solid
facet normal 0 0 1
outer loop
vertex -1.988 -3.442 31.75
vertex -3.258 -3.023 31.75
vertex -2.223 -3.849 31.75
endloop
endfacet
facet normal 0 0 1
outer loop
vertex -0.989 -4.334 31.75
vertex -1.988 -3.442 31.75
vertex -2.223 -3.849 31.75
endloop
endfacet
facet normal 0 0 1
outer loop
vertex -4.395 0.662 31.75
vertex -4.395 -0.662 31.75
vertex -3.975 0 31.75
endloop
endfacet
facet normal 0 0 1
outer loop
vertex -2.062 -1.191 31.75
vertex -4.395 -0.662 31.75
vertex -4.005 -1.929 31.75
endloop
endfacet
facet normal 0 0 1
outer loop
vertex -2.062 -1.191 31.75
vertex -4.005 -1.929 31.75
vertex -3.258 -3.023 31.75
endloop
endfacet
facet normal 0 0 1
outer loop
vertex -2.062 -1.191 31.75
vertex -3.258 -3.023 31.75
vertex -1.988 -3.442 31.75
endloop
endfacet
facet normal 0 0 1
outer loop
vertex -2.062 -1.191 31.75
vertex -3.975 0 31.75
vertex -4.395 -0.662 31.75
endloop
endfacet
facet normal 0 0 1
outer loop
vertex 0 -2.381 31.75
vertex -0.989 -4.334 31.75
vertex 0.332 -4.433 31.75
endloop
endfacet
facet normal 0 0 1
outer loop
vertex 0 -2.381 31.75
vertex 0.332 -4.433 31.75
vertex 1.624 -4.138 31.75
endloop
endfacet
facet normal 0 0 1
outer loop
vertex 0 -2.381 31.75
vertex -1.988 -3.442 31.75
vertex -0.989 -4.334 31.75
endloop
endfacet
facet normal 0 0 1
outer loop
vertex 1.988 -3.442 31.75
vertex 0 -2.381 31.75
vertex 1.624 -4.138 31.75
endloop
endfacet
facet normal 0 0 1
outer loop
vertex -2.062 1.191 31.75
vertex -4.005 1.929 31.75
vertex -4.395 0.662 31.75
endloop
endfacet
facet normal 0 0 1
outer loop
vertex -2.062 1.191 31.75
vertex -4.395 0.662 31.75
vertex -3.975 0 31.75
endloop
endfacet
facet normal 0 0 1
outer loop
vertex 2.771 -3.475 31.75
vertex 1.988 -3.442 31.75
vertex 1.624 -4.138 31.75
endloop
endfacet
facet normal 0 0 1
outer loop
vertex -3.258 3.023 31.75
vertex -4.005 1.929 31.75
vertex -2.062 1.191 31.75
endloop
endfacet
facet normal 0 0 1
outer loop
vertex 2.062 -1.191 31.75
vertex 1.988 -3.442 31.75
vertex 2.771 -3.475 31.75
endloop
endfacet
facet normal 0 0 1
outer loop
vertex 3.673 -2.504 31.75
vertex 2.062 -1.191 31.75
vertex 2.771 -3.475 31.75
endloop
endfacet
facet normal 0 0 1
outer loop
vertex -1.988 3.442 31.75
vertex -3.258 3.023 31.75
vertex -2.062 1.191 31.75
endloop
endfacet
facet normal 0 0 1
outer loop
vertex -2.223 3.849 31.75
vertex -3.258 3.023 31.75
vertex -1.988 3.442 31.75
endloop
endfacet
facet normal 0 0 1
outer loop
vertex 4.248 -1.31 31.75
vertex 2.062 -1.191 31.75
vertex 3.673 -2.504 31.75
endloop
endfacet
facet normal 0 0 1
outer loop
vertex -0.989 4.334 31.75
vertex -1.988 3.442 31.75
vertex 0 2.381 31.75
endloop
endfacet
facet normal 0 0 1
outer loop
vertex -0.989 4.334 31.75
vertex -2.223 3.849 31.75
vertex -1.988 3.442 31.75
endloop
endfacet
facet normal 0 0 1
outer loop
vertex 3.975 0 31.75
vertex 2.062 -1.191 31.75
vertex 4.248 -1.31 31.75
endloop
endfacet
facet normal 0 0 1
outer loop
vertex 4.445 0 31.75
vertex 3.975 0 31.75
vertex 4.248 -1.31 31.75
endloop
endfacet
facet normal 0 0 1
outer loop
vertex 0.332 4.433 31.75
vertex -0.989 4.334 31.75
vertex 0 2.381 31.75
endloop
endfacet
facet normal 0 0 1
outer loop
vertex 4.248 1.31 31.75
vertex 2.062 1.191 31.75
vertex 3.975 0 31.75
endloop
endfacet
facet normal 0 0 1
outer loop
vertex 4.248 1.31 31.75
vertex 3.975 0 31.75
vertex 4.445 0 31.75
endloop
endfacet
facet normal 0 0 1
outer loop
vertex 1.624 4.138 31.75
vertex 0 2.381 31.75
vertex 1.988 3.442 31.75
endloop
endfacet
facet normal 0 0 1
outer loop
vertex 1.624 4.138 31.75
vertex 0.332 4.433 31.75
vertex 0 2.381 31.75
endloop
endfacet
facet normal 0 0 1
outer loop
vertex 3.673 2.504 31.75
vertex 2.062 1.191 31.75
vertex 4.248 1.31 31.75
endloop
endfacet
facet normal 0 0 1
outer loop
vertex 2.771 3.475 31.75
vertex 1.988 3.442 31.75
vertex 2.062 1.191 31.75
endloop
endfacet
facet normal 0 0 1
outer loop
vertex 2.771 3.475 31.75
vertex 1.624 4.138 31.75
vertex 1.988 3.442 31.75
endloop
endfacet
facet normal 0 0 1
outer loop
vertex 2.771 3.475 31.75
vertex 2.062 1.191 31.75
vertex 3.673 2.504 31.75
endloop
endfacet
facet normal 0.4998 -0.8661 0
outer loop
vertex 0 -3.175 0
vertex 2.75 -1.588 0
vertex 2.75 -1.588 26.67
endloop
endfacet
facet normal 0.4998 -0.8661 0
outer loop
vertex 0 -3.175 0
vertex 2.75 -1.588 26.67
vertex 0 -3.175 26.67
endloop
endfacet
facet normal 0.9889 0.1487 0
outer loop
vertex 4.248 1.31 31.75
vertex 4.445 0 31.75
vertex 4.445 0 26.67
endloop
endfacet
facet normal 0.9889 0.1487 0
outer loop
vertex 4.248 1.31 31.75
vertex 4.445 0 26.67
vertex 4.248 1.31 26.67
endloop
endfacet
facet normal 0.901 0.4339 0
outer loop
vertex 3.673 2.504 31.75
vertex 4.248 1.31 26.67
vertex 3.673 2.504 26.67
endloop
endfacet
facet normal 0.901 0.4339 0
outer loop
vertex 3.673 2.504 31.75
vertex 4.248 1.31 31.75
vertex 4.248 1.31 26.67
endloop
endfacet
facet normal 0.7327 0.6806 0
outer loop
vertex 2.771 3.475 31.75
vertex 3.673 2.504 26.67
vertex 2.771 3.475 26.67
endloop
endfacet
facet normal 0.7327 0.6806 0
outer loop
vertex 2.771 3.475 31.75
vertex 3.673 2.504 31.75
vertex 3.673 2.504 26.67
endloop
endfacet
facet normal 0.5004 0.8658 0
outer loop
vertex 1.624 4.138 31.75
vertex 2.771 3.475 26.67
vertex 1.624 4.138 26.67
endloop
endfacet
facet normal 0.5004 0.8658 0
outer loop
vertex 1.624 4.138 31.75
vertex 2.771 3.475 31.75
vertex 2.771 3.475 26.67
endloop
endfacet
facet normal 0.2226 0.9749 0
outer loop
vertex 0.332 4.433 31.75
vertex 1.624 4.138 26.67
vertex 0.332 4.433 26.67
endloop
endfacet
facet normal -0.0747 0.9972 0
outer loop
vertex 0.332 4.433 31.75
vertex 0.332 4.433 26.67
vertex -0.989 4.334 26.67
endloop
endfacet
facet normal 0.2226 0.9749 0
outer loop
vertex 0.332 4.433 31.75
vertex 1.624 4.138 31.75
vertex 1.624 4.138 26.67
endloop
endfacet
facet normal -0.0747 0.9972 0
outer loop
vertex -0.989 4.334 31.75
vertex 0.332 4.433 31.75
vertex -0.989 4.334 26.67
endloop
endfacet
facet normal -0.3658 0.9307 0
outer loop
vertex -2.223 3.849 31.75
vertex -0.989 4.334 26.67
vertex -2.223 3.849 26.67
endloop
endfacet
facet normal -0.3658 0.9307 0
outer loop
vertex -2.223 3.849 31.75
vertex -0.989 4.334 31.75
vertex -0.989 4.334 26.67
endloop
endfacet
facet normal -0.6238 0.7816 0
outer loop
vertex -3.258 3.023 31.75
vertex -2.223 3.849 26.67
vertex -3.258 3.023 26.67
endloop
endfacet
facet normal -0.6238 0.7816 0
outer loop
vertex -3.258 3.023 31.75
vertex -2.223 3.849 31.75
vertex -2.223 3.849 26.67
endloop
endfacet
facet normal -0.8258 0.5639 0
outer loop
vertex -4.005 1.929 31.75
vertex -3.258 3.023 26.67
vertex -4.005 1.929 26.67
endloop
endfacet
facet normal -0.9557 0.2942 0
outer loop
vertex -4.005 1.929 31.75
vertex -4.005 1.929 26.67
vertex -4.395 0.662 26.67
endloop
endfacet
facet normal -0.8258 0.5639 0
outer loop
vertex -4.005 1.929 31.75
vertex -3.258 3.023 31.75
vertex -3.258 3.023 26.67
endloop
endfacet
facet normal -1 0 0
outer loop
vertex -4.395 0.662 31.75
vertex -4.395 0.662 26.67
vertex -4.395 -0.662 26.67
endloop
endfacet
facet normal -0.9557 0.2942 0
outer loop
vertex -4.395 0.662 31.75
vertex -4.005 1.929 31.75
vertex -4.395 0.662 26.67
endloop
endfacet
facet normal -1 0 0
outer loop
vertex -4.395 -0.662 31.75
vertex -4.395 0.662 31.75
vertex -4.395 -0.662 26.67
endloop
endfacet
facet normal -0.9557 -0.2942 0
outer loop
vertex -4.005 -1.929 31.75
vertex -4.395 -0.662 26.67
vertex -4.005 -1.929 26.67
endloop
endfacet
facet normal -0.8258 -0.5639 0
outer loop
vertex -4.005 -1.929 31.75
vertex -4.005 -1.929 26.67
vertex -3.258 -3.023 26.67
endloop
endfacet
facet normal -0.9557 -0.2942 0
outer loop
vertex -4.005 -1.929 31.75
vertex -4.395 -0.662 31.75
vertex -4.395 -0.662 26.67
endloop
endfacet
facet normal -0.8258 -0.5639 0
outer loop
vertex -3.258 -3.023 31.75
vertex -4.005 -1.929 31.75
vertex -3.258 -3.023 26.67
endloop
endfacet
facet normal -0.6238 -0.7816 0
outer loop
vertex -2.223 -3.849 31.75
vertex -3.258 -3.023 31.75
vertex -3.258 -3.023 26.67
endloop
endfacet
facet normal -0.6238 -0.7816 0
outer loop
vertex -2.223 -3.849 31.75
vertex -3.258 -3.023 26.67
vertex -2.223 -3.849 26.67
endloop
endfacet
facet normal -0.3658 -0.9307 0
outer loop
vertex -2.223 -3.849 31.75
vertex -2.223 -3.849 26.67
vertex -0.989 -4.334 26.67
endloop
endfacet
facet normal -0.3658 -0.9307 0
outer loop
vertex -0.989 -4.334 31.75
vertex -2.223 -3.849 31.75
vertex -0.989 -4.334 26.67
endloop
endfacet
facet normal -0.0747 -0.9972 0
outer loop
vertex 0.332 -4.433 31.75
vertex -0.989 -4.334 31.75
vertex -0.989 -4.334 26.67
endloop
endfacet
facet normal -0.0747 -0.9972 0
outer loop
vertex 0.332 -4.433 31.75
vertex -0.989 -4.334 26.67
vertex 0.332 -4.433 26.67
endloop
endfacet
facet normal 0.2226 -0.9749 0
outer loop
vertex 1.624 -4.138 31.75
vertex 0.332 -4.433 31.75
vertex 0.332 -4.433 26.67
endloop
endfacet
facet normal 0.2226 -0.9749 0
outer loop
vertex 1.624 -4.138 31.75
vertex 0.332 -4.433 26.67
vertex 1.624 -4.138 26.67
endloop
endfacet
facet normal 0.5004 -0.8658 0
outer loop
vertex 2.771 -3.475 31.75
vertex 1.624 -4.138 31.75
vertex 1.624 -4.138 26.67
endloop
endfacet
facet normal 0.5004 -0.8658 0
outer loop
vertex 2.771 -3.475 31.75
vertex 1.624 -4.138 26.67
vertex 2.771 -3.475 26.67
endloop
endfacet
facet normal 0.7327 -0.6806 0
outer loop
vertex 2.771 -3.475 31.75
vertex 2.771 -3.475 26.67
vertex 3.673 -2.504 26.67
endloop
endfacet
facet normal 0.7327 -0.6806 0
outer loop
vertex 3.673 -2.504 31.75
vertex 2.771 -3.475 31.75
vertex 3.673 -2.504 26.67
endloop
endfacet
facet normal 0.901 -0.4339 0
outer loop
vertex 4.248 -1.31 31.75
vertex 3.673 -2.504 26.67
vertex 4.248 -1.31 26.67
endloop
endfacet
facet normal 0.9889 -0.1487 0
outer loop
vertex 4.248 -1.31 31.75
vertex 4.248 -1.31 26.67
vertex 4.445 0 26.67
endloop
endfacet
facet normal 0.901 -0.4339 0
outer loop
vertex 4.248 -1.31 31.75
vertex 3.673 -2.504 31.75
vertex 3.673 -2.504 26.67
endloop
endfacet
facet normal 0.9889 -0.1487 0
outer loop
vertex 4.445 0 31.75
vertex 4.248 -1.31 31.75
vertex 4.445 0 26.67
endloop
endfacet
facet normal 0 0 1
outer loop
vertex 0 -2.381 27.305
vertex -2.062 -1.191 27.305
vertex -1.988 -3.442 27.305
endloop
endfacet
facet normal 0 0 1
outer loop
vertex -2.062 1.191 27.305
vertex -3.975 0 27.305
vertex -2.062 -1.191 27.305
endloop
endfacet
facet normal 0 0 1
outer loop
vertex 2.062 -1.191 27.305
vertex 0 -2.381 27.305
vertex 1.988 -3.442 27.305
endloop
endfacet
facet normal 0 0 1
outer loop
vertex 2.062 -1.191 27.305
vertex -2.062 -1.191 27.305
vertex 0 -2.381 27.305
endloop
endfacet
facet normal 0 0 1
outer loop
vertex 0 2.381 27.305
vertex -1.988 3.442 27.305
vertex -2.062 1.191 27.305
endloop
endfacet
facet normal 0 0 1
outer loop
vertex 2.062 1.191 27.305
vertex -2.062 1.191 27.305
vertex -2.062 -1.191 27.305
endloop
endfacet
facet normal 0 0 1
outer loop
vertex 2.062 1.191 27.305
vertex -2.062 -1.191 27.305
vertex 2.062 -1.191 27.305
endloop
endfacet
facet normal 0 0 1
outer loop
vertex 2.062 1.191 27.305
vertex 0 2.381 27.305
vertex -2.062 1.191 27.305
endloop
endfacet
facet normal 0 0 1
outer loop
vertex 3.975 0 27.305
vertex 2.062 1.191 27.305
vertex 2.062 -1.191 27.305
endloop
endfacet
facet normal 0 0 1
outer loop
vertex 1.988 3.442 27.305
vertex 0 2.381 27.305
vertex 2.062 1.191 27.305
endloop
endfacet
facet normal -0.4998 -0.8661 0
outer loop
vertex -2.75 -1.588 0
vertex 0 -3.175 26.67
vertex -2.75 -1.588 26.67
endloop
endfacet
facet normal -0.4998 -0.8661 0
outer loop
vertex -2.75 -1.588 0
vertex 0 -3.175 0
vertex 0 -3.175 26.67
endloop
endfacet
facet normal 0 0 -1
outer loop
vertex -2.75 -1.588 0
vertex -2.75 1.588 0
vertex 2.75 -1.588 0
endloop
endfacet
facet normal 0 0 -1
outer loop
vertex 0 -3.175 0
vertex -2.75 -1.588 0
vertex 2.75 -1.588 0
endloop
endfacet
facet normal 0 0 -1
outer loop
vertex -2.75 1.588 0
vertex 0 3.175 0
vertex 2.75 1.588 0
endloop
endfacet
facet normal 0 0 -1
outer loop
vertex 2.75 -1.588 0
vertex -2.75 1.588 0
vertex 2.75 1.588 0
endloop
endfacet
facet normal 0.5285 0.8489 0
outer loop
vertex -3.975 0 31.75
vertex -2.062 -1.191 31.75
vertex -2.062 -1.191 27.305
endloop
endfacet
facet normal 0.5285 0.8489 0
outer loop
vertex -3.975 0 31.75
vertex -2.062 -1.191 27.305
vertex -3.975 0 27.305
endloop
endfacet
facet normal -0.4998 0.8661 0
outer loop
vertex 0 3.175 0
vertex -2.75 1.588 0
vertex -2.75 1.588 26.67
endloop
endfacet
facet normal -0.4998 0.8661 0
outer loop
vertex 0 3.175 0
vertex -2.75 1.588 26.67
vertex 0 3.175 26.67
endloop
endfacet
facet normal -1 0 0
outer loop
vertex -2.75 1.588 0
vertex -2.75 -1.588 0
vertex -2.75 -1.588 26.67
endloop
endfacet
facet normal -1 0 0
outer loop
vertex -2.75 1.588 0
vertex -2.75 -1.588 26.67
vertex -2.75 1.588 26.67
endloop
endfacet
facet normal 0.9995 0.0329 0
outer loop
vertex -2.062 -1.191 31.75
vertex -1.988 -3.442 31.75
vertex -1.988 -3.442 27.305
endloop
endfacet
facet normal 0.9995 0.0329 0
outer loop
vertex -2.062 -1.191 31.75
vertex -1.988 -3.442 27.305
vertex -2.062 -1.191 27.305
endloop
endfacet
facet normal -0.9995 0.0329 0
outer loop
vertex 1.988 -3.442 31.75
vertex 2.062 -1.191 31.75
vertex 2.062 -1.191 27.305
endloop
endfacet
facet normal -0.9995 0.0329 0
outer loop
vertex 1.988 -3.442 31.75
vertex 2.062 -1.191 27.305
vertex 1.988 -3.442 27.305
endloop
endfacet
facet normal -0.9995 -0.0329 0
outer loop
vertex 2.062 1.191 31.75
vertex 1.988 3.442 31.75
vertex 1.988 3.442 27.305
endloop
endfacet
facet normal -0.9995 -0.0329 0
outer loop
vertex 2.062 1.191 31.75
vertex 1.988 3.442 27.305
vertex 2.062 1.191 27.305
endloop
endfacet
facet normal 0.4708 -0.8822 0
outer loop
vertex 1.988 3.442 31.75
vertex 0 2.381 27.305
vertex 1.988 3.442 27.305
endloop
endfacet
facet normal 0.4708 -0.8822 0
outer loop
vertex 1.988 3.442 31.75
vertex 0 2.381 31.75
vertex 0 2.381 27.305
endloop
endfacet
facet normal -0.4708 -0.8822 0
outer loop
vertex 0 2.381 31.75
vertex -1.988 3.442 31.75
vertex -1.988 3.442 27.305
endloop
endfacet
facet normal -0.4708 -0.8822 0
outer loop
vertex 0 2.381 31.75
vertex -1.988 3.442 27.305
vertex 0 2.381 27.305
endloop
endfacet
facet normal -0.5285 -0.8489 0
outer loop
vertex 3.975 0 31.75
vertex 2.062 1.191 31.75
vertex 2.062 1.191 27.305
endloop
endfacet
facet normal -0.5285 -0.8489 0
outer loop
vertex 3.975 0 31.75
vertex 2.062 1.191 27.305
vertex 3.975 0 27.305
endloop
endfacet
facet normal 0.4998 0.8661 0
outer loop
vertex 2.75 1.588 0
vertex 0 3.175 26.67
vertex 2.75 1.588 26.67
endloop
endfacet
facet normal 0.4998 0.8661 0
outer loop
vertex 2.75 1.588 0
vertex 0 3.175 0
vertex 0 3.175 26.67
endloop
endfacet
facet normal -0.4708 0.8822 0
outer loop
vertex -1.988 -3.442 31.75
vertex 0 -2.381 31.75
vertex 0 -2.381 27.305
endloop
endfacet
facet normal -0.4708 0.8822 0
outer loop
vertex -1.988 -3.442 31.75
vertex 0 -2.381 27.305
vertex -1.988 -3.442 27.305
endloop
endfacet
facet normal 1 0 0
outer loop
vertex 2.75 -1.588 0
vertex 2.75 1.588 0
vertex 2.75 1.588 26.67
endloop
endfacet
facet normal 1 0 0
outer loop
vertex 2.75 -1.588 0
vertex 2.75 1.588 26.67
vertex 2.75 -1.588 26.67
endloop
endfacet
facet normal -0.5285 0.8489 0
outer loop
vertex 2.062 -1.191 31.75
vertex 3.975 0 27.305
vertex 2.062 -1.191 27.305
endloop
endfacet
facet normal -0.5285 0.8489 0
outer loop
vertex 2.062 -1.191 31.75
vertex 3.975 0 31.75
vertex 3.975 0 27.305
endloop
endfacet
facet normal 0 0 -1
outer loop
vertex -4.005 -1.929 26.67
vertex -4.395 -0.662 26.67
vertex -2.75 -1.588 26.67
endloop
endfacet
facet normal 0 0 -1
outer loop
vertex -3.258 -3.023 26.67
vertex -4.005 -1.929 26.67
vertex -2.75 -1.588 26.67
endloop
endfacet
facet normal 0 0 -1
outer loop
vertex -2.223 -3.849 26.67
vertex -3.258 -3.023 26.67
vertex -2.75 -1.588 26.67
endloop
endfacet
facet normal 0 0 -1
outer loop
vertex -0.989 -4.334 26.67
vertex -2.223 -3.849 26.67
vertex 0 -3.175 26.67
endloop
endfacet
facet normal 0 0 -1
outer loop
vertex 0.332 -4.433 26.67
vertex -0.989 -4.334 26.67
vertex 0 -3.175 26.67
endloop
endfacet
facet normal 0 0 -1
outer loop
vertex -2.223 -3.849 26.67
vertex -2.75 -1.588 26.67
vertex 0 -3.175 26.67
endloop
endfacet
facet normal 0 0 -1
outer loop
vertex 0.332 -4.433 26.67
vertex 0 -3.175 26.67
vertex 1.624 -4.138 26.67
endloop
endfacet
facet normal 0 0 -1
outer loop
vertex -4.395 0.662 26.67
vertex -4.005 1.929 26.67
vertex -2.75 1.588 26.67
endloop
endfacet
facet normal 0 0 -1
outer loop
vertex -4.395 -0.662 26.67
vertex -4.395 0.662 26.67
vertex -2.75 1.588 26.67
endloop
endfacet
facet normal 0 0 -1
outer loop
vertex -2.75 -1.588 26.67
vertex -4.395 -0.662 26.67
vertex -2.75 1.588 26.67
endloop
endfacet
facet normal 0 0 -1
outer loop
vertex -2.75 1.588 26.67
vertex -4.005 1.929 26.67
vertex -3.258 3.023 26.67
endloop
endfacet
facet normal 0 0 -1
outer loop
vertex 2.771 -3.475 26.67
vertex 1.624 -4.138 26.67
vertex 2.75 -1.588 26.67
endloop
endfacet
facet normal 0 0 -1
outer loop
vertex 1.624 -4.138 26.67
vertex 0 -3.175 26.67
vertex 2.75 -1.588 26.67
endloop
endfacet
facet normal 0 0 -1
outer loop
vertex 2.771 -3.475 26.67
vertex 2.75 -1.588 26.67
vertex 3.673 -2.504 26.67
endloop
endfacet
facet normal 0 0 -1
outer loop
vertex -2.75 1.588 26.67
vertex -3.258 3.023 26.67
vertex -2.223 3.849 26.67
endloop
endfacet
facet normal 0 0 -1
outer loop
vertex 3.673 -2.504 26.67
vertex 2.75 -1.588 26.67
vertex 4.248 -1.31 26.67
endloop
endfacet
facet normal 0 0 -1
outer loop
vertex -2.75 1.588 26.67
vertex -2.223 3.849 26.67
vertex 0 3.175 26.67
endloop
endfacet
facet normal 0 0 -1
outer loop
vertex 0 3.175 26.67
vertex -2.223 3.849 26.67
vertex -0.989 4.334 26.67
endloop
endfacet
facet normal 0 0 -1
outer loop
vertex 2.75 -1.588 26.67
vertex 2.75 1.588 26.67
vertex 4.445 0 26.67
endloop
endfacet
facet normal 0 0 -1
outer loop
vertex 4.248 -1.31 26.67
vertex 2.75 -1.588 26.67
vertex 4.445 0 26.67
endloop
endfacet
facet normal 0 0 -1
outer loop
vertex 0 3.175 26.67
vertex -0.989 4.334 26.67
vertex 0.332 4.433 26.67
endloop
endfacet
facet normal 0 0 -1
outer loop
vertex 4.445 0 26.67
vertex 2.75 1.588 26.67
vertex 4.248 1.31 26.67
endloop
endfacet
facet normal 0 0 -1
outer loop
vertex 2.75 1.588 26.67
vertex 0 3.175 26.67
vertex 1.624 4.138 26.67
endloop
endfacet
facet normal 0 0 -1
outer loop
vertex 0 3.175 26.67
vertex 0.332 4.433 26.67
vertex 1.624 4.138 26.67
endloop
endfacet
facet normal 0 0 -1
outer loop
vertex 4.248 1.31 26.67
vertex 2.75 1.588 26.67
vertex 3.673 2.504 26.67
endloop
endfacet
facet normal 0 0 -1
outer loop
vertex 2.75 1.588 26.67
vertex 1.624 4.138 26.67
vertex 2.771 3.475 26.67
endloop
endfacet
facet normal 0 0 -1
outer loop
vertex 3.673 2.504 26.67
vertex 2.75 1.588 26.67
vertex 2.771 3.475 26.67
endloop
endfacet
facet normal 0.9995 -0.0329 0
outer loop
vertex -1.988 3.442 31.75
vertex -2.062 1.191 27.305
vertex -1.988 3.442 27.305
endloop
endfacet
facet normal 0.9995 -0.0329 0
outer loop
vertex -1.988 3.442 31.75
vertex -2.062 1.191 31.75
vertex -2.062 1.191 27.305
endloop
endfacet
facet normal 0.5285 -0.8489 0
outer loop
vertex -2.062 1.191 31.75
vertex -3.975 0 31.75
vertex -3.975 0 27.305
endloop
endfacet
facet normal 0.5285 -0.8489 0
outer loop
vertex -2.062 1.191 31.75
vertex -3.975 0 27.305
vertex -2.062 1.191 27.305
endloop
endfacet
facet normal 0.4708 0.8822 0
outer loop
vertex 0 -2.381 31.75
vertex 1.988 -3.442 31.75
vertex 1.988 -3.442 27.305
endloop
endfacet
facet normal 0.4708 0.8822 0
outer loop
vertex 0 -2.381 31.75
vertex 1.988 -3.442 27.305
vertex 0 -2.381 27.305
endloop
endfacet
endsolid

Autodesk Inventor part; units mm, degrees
ref_plane "YZ Plane" through (0, 0, 0) normal (1, 0, 0) x (0, 1, 0)
ref_plane "XZ Plane" through (0, 0, 0) normal (0, 1, 0) x (-1, 0, 0)
ref_plane "XY Plane" through (0, 0, 0) normal (0, 0, 1) x (1, 0, 0)
sketch "Sketch1" plane through (0, 0, 0) normal (0, 0, 1) x (1, 0, 0)
  line L0 (0, 3.175) -> (2.7496, 1.5875)
  line L1 (2.7496, 1.5875) -> (2.7496, -1.5875)
  line L2 (2.7496, -1.5875) -> (0, -3.175)
  line L3 (0, -3.175) -> (-2.7496, -1.5875)
  line L4 (-2.7496, -1.5875) -> (-2.7496, 1.5875)
  line L5 (-2.7496, 1.5875) -> (0, 3.175)
  point P0 (0, 0)
  point P1 (0, 0)
  dimension "d0" = 6.35
  dimension "d1" = 2.7496
extrude "Extrusion1" add sketch "Sketch1" along normal blind 31.75
sketch "Sketch2" plane through (0, 0, 31.75) normal (0, 0, 1) x (1, 0, 0)
  circle A0 centre (0, 0) radius 4.445
  dimension "d4" = 8.89
extrude "Extrusion2" add sketch "Sketch2" against normal blind 5.08
sketch "Sketch3" plane through (0, 0, 31.75) normal (0, 0, 1) x (1, 0, 0)
  circle A0 centre (0, 0) radius 3.9751 construction
  circle A1 centre (0, 0) radius 2.3813 construction
  line L0 (-5.2785, 0) -> (7.6367, 0) construction
  line L1 (2.0622, 1.1906) -> (3.9751, 0)
  line L2 (3.9751, 0) -> (2.0622, -1.1906)
  line L3 (2.0622, -1.1906) -> (2.0622, 1.1906)
  line L4 (0, 2.3813) -> (1.9876, 3.4425)
  line L5 (1.9876, 3.4425) -> (2.0622, 1.1906)
  line L6 (2.0622, 1.1906) -> (0, 2.3813)
  line L7 (-2.0622, 1.1906) -> (-1.9875, 3.4425)
  line L8 (-1.9875, 3.4425) -> (0, 2.3812)
  line L9 (0, 2.3812) -> (-2.0622, 1.1906)
  line L10 (-2.0622, -1.1906) -> (-3.9751, 0)
  line L11 (-3.9751, 0) -> (-2.0622, 1.1906)
  line L12 (-2.0622, 1.1906) -> (-2.0622, -1.1906)
  line L13 (0, -2.3813) -> (-1.9876, -3.4425)
  line L14 (-1.9876, -3.4425) -> (-2.0622, -1.1906)
  line L15 (-2.0622, -1.1906) -> (0, -2.3813)
  line L16 (2.0622, -1.1906) -> (1.9875, -3.4425)
  line L17 (1.9875, -3.4425) -> (0, -2.3813)
  line L18 (0, -2.3813) -> (2.0622, -1.1906)
  dimension "d7" = 7.9502
  dimension "d8" = 4.7625
  dimension "d9" = 2.0216
  dimension "d10" = 60
  dimension "d11" = 2.3813
  dimension "d14" = 360
extrude "Extrusion3" cut sketch "Sketch3" against normal blind 4.445 contours L1 L2 L3 | L6 L4 L5 | L16 L17 L18 | L9 L7 L8 | L13 L14 L15 | L12 L10 L11
sketch "Sketch4" plane through (0, 0, 31.75) normal (0, 0, 1) x (1, 0, 0)
  line L0 (2.0622, 1.1906) -> (0, 2.3812) projected
  line L1 (0, 2.3812) -> (-2.0622, 1.1906) projected
  line L2 (-2.0622, 1.1906) -> (-2.0622, -1.1906) projected
  line L3 (-2.0622, -1.1906) -> (0, -2.3813) projected
  line L4 (0, -2.3813) -> (2.0622, -1.1906) projected
  line L5 (2.0622, -1.1906) -> (2.0622, 1.1906) projected
  point P0 (0, 0)
extrude "Extrusion4" cut sketch "Sketch4" against normal blind 4.445
properties part number "000111"
